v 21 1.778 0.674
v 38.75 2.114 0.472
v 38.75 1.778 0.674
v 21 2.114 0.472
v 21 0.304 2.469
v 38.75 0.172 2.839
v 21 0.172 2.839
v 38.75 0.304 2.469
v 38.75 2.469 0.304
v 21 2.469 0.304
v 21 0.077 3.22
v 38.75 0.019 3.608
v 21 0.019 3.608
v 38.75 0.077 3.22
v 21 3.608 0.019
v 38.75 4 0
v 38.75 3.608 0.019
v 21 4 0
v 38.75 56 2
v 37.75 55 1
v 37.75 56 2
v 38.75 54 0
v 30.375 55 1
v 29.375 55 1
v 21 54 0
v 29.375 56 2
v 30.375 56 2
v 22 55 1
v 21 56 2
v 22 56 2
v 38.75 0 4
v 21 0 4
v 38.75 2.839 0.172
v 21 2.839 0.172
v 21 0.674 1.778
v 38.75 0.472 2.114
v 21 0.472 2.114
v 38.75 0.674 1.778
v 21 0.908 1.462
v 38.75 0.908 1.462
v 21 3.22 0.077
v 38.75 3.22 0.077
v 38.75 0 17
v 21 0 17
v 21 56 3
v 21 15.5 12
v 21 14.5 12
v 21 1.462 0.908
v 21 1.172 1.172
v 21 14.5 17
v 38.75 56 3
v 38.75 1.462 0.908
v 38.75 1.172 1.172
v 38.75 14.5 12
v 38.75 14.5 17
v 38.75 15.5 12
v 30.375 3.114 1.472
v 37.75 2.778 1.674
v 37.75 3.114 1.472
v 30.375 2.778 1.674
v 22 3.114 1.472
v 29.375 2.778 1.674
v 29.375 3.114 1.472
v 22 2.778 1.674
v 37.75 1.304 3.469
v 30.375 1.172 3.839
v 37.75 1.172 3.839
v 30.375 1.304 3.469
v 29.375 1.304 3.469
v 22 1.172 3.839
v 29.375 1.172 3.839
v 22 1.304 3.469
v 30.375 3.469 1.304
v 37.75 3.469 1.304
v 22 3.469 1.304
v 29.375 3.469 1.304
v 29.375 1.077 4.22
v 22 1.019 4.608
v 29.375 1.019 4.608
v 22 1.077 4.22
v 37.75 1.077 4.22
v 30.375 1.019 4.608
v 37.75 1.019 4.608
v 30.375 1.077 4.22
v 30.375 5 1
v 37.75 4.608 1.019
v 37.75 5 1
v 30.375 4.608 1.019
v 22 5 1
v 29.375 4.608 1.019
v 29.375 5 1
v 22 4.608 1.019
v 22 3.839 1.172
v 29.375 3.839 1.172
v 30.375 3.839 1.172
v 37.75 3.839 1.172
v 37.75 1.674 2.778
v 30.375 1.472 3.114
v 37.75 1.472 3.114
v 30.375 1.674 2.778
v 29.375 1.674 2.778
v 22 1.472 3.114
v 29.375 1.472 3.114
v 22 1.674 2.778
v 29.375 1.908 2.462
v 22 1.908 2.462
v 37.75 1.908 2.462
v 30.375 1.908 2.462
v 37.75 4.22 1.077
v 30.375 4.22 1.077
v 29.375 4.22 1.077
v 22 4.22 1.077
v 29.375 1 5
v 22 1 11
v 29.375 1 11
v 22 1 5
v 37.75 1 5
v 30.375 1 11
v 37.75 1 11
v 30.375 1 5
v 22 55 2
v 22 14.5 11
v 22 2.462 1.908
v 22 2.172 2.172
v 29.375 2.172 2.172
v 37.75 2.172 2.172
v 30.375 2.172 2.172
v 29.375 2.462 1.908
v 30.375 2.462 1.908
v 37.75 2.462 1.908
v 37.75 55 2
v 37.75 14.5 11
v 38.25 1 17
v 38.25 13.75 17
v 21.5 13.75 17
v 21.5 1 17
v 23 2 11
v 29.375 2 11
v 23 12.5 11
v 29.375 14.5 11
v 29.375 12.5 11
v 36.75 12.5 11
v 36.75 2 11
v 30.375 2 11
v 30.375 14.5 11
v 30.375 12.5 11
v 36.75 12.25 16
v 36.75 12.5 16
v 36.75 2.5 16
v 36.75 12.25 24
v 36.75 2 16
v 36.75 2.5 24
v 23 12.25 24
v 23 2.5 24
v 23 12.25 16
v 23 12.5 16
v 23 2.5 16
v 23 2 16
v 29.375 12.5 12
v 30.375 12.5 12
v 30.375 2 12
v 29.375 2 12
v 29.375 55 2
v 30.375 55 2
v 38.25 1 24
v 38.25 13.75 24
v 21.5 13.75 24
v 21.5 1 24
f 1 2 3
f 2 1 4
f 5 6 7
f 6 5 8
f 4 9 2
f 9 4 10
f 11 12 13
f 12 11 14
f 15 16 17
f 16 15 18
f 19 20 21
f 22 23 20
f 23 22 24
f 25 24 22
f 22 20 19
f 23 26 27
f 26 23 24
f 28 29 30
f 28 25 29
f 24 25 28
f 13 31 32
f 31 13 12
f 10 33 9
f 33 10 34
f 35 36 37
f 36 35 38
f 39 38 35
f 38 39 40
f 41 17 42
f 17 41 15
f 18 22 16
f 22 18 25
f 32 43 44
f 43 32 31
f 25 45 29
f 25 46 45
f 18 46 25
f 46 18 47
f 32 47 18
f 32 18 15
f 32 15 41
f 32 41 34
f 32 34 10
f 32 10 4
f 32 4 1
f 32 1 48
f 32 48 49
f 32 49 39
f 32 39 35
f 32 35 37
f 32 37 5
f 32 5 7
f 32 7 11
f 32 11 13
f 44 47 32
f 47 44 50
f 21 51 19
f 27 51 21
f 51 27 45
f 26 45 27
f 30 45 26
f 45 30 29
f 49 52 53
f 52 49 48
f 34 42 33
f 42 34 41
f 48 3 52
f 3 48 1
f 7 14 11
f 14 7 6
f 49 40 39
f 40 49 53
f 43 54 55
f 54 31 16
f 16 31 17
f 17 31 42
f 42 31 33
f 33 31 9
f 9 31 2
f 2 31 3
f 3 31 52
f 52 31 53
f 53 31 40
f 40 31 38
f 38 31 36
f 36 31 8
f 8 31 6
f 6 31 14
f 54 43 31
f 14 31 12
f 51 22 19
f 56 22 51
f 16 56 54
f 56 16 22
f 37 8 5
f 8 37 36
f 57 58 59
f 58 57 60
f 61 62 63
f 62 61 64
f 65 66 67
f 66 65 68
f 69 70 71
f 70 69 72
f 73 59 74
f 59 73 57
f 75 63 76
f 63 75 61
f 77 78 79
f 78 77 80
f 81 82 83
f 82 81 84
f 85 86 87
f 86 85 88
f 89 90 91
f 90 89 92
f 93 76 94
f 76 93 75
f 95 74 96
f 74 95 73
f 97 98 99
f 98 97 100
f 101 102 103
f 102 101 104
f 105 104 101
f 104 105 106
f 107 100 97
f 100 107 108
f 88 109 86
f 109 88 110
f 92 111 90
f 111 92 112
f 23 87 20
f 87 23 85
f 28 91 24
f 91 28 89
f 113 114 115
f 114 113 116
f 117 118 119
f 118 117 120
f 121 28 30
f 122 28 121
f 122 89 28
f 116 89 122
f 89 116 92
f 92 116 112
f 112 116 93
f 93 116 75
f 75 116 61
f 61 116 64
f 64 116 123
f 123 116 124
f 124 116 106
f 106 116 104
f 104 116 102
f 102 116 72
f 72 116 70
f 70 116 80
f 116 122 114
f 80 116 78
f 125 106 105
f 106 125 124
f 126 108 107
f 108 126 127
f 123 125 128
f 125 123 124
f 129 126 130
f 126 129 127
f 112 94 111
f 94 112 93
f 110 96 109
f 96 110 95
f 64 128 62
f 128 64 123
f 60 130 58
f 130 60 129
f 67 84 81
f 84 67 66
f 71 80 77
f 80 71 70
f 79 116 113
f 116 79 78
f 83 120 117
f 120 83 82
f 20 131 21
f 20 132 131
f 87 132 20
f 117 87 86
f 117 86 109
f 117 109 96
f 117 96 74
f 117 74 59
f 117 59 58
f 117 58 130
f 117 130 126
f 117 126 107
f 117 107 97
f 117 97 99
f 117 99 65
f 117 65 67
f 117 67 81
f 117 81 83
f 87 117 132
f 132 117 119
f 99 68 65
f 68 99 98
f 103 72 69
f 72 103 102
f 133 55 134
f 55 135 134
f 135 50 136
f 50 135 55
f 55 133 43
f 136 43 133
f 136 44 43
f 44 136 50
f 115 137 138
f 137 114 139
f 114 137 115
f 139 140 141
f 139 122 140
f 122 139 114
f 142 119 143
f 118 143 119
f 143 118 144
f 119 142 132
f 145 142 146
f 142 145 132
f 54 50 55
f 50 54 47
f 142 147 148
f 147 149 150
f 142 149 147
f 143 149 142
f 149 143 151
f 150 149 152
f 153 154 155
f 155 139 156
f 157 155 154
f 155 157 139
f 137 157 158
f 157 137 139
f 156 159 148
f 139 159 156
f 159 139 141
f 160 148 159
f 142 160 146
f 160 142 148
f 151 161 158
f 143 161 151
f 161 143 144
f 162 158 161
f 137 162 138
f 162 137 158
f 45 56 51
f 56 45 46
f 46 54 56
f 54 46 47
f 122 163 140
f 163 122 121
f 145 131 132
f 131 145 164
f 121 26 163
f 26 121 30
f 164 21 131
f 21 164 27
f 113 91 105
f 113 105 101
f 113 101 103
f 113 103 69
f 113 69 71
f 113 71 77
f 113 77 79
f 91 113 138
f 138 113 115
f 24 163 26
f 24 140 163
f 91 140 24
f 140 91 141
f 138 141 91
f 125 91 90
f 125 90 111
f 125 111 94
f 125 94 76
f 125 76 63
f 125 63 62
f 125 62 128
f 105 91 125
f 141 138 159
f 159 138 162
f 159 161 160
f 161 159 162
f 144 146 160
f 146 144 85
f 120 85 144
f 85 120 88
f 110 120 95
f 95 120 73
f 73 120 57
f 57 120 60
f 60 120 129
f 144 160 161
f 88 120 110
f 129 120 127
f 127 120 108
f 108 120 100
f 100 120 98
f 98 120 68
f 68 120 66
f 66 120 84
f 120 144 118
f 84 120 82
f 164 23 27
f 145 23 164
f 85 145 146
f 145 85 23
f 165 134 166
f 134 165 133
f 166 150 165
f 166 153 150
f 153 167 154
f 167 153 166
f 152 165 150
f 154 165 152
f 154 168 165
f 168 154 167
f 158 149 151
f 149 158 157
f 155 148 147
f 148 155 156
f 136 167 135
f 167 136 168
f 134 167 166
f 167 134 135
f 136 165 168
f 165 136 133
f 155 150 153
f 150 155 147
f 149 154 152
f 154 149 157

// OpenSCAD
shroudToNozzle = 62;
mountToSickle = 32;
sickleLength = 44;
sickleDepth = 21; // at least - opt for semi-circular
mountOuterX = 17.75;
wallWidth = 1;
heightBelowFan = 17;
heightBeforeBend = 6;
mountInnerY = 13;
mountOuterY = 15.5;
mountHeight = 15;
mountSideHoleWidth = 2.5;
mountSideHoleHeight = 11.5; //1.25 from top/bottom of mount area
stovePipeHeight = 10;

mountToTaper = 55;

module stovePipe() {
    translate([wallWidth*0.5,wallWidth,heightBelowFan-1])
    difference() {
        cube([16.75,12.75,8]);
        translate([wallWidth*1.5,wallWidth*1.5,-1]) cube([13.75,9.75,stovePipeHeight]);
    }
}

module motorSpan() {
    diameter = 8;
    height = 1;

    difference() {
        translate([mountOuterX/2-wallWidth*0.5,0,0]) taperSide(8,wallWidth);
        //translate([mountOuterX/2-wallWidth*1.5,mountToTaper-4,-1]) cube([3,5,6]);
    }

    difference() {
        taperSide(8,mountOuterX);
        translate([wallWidth,wallWidth,wallWidth]) taperSide(8,mountOuterX-wallWidth*2);

        // hole on bottom
        //translate([wallWidth,mountToTaper-wallWidth*2,-1]) cube([mountOuterX-wallWidth*2,wallWidth*2,wallWidth*2]);
    }
    //translate([mountOuterX-wallWidth,0,0]) taperSide(8,1);

    taperTop();
}

module taperSide(diameter, height) {
    hull() {
        translate([0,diameter/2,diameter/2]) rotate([0,90,0]) cylinder(d=diameter,h=height,$fn=64);
        translate([0,0,heightBelowFan-heightBeforeBend]) cube([height,1,1]);
        translate([0,mountInnerY,heightBelowFan-heightBeforeBend]) cube([height,1,1]);
        translate([0,mountToTaper,2]) cube([height,1,1]);
        translate([0,mountToTaper-2,0]) cube([height,1,1]);
    }
}

module taperTop() {
    //translate([0,mountToTaper,1]) cube([mountOuterX,wallWidth,wallWidth]);

    translate([0,0,heightBelowFan-heightBeforeBend]) {
        difference() {
            cube([mountOuterX,mountOuterY-1,heightBeforeBend]);
            translate([wallWidth*2,2,-1]) cube([mountOuterX-2-wallWidth*2, mountOuterY-3-wallWidth*2,heightBeforeBend+2]);
        }


        translate([0,mountOuterY-wallWidth,0]) {
            hull() {
                cube([mountOuterX,wallWidth,wallWidth]);
                translate([0,mountToTaper-mountOuterY+wallWidth,-(heightBelowFan-heightBeforeBend-2)]) cube([mountOuterX,wallWidth,wallWidth]);
            }
        }
    }
}

//translate([10,32.7,19.8])
color("white",0.6)
translate([sickleDepth,0,0]) {
    motorSpan();
    stovePipe();
}

// total height below press fitting = 17mm
